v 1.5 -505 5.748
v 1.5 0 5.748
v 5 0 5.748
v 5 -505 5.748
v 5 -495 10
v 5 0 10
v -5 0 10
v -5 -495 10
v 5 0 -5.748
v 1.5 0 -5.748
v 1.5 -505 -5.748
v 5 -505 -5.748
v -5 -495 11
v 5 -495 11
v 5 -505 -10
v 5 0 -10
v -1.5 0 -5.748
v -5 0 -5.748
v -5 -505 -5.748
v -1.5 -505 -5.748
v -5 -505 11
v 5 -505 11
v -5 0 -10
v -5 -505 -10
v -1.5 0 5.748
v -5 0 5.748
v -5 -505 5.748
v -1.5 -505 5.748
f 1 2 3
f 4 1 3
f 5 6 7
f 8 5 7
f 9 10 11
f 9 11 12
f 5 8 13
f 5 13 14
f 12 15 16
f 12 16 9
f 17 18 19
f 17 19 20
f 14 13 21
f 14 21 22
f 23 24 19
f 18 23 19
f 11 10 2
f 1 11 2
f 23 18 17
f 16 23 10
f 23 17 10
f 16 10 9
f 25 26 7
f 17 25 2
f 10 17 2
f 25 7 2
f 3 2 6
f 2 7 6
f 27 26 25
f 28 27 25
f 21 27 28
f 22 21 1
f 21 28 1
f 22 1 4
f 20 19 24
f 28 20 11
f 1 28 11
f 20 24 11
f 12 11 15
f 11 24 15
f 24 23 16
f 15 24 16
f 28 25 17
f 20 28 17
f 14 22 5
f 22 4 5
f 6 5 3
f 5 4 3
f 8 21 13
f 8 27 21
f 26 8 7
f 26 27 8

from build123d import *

# Parameters (mm, degrees)
F0_W     = 3.5
F0_H     = 4.252
F1_DEPTH = 505
F2_W     = 10
F2_H     = 10
F3_DEPTH = 1


with BuildPart() as f1:
    # F0 (on Front) → F1 (new body)
    with BuildSketch(Plane.XZ):
        Polygon((1.5, 10), (-1.5, 10), (-1.5, 5.748), (-1.5, -5.748), (-1.5, -10), (1.5, -10), (1.5, -5.748), (1.5, 5.748), align=None)
        with Locations((-3.25, -7.874)):
            Rectangle(F0_W, F0_H)
        with Locations((3.25, -7.874)):
            Rectangle(F0_W, F0_H)
        with Locations((3.25, 7.874)):
            Rectangle(F0_W, F0_H)
        with Locations((-3.25, 7.874)):
            Rectangle(F0_W, F0_H)
    extrude(amount=F1_DEPTH)

    # F2 (on face) → F3 (join)
    with BuildSketch(Plane.XY.offset(10)):
        with Locations((0, -500)):
            Rectangle(F2_W, F2_H)
    extrude(amount=F3_DEPTH)


solid = f1.part
